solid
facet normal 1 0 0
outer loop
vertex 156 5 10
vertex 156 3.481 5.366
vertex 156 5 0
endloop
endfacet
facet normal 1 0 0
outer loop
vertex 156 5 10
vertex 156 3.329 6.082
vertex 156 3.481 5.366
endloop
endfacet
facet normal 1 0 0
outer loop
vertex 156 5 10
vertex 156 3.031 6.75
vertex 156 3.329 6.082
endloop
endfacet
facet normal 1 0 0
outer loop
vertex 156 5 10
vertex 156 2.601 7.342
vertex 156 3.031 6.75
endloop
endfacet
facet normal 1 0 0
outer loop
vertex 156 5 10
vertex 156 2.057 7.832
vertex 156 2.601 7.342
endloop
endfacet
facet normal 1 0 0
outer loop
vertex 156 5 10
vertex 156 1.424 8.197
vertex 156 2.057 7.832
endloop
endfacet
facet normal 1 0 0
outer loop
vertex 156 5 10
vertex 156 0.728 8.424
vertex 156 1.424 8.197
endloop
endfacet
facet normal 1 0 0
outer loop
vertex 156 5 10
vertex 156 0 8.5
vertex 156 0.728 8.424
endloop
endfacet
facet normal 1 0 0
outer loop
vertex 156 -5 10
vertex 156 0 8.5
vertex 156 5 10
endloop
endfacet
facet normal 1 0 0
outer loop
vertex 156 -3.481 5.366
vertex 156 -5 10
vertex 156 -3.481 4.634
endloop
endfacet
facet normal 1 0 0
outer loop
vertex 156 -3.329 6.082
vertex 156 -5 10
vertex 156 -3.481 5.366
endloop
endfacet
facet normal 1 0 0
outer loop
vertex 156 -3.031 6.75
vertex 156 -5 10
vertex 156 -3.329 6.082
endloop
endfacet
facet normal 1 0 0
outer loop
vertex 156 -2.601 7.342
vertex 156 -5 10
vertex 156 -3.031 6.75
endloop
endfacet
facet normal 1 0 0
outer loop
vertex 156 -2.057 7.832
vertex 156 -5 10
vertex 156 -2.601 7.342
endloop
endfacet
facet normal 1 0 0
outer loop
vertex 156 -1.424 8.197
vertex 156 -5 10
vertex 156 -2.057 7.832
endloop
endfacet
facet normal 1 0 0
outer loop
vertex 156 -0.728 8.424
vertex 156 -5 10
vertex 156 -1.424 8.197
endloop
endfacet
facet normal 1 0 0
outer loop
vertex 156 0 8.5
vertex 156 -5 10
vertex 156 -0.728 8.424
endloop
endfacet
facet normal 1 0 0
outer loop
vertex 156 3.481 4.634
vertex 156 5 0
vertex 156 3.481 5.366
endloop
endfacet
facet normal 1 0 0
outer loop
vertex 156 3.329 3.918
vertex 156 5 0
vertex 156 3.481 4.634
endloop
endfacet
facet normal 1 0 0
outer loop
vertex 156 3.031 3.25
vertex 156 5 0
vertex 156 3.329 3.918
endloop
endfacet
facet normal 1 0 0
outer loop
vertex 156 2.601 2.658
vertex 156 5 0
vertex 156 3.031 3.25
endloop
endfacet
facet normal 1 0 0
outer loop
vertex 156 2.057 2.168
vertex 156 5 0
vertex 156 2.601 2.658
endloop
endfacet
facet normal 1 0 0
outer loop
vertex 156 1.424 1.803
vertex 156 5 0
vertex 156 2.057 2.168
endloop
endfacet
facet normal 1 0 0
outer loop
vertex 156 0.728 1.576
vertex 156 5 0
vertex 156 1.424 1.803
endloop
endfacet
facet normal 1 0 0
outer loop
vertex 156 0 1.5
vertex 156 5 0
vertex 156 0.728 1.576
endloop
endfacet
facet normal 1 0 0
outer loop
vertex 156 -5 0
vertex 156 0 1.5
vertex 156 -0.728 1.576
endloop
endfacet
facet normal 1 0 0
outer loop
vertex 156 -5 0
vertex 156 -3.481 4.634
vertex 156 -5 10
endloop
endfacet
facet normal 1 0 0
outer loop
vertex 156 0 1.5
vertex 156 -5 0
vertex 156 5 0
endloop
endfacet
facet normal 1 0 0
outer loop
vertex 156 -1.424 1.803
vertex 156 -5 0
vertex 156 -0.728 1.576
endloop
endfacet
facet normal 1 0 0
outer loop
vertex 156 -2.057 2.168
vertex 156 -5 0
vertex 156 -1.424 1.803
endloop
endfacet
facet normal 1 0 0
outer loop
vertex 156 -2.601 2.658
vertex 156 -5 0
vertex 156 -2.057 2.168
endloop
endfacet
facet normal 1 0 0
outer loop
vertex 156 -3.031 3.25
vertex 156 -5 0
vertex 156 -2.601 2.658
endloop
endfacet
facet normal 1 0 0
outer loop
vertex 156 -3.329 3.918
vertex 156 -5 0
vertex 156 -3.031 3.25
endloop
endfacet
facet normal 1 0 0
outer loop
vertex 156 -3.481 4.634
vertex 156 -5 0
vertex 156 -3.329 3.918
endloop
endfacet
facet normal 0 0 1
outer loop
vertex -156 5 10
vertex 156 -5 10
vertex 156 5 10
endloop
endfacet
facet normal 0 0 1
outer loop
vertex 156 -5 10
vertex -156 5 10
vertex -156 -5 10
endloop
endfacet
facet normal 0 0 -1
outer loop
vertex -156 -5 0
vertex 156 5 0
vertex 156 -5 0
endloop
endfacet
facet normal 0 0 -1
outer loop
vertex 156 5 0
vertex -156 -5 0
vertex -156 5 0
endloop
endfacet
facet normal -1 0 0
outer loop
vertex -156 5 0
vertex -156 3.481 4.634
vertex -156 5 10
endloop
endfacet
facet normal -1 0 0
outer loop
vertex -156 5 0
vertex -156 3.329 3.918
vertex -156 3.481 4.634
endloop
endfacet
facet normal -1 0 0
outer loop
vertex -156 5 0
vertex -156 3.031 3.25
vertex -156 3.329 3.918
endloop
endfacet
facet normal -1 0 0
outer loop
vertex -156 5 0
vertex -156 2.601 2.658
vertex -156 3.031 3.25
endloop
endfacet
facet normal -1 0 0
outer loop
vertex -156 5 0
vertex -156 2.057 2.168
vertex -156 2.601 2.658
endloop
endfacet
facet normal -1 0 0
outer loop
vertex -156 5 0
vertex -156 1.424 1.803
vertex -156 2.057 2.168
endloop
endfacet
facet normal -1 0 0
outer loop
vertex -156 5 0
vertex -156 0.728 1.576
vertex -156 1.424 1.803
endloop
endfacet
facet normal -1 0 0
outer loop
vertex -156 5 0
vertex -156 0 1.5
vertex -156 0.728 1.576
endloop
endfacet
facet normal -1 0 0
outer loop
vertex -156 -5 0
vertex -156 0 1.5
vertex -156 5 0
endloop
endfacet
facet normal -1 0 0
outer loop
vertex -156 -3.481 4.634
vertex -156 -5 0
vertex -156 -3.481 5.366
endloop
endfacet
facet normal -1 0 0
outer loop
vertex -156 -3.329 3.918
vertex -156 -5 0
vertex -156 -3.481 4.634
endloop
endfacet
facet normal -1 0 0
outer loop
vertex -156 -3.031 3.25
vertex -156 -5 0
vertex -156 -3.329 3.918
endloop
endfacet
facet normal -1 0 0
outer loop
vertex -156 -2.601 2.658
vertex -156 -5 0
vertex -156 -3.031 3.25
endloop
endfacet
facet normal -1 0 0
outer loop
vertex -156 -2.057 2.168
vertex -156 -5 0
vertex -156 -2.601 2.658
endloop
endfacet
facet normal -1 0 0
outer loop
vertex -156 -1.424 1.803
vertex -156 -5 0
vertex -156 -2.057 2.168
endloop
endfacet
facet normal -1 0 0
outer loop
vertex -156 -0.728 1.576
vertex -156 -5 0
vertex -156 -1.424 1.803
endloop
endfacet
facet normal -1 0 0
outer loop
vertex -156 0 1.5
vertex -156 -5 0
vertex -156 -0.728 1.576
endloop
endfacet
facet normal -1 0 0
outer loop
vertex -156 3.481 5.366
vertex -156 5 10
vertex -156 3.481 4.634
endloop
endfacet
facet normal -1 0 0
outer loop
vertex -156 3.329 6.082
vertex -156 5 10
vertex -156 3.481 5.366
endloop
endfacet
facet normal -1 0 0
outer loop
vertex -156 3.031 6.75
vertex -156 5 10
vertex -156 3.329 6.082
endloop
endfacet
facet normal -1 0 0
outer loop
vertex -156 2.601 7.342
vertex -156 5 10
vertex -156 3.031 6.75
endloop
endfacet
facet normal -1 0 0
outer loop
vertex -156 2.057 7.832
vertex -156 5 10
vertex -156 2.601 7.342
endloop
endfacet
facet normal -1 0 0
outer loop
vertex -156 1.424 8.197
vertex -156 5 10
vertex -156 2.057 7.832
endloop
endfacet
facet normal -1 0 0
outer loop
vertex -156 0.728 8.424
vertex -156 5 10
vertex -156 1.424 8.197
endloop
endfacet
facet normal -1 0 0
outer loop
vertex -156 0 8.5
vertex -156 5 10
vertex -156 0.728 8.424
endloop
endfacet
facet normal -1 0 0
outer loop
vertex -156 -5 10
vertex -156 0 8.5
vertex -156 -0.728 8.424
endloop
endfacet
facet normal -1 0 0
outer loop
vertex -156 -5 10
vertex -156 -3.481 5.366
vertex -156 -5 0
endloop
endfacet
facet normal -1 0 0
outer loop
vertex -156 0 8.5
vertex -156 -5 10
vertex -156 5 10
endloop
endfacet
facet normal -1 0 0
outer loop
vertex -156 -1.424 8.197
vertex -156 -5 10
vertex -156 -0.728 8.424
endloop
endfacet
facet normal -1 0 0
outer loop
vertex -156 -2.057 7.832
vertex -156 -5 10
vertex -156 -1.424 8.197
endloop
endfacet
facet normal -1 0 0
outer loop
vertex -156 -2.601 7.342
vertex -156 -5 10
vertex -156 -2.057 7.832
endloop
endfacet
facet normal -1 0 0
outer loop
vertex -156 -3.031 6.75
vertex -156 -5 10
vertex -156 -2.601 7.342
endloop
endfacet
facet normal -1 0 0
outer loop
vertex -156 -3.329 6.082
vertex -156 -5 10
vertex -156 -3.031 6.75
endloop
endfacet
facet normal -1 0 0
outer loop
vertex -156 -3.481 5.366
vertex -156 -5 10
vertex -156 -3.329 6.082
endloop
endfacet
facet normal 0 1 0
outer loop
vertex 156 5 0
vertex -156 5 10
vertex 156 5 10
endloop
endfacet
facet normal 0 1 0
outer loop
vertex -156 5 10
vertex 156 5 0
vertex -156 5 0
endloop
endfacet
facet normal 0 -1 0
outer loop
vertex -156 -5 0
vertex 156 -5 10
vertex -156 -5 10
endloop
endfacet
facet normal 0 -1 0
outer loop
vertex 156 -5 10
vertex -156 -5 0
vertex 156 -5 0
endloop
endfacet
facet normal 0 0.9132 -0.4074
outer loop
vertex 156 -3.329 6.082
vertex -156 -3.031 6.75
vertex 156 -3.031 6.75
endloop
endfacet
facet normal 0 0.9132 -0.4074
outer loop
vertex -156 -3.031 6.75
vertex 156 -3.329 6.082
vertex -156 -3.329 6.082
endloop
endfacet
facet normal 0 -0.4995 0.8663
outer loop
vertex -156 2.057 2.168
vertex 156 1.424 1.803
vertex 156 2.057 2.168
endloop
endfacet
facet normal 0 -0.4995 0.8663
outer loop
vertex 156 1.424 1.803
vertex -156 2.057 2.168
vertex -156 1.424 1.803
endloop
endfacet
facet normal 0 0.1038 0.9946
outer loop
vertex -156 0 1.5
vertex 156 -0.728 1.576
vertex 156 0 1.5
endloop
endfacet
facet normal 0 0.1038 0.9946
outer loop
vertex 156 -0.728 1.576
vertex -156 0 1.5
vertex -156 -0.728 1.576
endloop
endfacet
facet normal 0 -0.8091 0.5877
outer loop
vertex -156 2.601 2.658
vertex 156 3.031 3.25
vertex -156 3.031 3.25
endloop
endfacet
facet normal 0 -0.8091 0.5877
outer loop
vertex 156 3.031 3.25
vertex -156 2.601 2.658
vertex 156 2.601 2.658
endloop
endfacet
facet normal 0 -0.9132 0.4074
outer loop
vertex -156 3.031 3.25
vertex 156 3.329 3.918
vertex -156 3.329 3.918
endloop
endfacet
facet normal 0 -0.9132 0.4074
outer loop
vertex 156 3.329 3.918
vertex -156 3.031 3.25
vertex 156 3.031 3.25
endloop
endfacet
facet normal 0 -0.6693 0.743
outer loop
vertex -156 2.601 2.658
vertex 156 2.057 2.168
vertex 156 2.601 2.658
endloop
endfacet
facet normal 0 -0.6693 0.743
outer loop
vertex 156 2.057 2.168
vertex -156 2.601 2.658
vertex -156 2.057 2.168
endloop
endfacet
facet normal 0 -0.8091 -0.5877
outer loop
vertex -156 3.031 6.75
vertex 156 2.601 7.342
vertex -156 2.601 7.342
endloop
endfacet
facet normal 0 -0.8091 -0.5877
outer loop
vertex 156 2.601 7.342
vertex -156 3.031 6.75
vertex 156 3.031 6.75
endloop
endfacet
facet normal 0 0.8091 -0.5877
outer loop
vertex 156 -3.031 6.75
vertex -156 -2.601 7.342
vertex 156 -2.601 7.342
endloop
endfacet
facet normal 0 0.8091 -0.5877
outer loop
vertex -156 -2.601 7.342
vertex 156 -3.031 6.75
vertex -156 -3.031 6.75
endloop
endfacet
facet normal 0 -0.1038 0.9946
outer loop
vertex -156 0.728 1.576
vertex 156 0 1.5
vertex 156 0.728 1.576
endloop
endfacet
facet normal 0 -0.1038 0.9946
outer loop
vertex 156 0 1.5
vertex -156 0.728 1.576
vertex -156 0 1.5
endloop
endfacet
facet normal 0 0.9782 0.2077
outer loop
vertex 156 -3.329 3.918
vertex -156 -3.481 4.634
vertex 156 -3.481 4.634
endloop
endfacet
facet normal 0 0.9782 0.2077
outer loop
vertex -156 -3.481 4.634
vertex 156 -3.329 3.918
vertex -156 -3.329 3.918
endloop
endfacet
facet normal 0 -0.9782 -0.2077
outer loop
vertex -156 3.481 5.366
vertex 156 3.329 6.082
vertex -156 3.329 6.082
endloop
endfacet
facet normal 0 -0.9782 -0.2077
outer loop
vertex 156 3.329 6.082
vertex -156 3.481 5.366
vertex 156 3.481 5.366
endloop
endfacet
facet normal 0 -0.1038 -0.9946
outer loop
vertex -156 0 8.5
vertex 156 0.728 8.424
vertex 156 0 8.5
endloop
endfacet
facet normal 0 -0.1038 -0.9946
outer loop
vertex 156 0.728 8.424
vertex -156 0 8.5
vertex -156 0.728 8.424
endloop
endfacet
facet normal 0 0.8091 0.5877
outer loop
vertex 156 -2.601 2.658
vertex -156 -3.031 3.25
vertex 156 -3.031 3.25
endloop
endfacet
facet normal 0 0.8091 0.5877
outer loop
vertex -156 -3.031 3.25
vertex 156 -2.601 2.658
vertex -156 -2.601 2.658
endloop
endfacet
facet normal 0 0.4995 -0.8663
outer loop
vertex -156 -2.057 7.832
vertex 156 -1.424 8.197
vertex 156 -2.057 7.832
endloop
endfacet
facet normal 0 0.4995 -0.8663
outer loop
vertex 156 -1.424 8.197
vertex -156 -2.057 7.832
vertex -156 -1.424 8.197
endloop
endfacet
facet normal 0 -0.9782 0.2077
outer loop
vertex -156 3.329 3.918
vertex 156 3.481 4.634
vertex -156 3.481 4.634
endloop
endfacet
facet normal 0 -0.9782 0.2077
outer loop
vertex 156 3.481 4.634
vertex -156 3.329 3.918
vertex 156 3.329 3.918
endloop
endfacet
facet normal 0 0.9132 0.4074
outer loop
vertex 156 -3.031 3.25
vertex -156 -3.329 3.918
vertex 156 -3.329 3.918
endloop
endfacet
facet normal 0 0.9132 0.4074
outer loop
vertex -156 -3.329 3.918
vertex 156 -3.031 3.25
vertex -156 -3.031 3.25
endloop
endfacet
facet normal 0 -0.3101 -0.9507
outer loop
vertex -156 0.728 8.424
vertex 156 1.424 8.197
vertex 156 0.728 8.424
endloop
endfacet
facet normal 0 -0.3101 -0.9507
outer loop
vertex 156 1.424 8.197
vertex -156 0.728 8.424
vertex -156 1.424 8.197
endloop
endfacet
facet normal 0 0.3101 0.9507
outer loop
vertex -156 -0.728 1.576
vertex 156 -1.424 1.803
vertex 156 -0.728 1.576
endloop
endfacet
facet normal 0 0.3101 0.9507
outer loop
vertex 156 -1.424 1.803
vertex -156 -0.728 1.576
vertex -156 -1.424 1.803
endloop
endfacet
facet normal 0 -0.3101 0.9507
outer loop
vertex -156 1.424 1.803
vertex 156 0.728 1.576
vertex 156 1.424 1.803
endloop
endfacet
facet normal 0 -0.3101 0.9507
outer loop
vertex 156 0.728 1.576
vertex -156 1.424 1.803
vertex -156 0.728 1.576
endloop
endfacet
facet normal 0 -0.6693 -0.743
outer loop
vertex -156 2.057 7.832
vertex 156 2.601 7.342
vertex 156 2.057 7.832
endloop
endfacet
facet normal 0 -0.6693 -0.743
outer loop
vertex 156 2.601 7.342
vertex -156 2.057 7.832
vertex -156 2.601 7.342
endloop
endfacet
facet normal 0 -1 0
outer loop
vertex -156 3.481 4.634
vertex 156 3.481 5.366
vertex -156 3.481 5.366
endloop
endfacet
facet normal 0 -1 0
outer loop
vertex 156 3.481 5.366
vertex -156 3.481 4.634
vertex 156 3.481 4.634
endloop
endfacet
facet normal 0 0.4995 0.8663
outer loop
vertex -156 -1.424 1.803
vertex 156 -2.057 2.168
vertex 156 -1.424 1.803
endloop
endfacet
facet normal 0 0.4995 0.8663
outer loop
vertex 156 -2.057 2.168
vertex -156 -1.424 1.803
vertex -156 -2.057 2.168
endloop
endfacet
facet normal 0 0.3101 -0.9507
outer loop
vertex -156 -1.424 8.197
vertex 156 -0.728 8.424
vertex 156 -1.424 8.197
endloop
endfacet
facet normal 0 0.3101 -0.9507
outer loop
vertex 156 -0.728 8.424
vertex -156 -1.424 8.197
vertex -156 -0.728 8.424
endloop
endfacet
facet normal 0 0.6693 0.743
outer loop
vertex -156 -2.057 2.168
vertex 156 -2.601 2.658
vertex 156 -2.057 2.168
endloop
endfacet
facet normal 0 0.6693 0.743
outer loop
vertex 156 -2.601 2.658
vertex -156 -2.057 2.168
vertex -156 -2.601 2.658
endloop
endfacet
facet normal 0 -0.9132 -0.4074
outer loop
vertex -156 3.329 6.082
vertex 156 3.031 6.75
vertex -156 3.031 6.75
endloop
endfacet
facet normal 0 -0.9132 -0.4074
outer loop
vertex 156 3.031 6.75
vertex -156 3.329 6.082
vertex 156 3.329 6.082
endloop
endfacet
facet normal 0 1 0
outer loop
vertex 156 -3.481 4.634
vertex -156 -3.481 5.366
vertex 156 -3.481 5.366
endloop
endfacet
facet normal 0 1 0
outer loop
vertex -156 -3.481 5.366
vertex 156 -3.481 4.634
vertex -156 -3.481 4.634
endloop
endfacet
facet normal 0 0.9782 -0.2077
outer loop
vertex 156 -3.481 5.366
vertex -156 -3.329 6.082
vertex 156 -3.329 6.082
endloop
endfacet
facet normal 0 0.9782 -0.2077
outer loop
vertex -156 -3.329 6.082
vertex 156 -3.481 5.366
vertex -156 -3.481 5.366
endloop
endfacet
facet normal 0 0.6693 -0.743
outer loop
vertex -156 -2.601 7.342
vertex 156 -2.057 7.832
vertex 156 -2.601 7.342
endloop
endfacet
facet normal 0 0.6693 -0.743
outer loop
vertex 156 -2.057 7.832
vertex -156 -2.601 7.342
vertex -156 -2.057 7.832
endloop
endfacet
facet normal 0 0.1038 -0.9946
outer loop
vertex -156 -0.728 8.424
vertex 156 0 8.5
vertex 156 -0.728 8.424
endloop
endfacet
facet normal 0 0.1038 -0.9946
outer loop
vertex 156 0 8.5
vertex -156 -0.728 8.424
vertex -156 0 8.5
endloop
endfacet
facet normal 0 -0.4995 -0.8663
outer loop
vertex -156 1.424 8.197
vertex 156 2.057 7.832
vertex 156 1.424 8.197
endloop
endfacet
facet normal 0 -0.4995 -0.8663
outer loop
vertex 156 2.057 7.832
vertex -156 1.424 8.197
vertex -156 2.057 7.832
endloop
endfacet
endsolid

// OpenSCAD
difference()
{
  translate([-156, -5, 0]) cube([312, 10, 10]);
  translate([-160, 0, 5]) rotate([0, 90, 0]) cylinder(d = 7, h = 320, $fn = 30);
}
